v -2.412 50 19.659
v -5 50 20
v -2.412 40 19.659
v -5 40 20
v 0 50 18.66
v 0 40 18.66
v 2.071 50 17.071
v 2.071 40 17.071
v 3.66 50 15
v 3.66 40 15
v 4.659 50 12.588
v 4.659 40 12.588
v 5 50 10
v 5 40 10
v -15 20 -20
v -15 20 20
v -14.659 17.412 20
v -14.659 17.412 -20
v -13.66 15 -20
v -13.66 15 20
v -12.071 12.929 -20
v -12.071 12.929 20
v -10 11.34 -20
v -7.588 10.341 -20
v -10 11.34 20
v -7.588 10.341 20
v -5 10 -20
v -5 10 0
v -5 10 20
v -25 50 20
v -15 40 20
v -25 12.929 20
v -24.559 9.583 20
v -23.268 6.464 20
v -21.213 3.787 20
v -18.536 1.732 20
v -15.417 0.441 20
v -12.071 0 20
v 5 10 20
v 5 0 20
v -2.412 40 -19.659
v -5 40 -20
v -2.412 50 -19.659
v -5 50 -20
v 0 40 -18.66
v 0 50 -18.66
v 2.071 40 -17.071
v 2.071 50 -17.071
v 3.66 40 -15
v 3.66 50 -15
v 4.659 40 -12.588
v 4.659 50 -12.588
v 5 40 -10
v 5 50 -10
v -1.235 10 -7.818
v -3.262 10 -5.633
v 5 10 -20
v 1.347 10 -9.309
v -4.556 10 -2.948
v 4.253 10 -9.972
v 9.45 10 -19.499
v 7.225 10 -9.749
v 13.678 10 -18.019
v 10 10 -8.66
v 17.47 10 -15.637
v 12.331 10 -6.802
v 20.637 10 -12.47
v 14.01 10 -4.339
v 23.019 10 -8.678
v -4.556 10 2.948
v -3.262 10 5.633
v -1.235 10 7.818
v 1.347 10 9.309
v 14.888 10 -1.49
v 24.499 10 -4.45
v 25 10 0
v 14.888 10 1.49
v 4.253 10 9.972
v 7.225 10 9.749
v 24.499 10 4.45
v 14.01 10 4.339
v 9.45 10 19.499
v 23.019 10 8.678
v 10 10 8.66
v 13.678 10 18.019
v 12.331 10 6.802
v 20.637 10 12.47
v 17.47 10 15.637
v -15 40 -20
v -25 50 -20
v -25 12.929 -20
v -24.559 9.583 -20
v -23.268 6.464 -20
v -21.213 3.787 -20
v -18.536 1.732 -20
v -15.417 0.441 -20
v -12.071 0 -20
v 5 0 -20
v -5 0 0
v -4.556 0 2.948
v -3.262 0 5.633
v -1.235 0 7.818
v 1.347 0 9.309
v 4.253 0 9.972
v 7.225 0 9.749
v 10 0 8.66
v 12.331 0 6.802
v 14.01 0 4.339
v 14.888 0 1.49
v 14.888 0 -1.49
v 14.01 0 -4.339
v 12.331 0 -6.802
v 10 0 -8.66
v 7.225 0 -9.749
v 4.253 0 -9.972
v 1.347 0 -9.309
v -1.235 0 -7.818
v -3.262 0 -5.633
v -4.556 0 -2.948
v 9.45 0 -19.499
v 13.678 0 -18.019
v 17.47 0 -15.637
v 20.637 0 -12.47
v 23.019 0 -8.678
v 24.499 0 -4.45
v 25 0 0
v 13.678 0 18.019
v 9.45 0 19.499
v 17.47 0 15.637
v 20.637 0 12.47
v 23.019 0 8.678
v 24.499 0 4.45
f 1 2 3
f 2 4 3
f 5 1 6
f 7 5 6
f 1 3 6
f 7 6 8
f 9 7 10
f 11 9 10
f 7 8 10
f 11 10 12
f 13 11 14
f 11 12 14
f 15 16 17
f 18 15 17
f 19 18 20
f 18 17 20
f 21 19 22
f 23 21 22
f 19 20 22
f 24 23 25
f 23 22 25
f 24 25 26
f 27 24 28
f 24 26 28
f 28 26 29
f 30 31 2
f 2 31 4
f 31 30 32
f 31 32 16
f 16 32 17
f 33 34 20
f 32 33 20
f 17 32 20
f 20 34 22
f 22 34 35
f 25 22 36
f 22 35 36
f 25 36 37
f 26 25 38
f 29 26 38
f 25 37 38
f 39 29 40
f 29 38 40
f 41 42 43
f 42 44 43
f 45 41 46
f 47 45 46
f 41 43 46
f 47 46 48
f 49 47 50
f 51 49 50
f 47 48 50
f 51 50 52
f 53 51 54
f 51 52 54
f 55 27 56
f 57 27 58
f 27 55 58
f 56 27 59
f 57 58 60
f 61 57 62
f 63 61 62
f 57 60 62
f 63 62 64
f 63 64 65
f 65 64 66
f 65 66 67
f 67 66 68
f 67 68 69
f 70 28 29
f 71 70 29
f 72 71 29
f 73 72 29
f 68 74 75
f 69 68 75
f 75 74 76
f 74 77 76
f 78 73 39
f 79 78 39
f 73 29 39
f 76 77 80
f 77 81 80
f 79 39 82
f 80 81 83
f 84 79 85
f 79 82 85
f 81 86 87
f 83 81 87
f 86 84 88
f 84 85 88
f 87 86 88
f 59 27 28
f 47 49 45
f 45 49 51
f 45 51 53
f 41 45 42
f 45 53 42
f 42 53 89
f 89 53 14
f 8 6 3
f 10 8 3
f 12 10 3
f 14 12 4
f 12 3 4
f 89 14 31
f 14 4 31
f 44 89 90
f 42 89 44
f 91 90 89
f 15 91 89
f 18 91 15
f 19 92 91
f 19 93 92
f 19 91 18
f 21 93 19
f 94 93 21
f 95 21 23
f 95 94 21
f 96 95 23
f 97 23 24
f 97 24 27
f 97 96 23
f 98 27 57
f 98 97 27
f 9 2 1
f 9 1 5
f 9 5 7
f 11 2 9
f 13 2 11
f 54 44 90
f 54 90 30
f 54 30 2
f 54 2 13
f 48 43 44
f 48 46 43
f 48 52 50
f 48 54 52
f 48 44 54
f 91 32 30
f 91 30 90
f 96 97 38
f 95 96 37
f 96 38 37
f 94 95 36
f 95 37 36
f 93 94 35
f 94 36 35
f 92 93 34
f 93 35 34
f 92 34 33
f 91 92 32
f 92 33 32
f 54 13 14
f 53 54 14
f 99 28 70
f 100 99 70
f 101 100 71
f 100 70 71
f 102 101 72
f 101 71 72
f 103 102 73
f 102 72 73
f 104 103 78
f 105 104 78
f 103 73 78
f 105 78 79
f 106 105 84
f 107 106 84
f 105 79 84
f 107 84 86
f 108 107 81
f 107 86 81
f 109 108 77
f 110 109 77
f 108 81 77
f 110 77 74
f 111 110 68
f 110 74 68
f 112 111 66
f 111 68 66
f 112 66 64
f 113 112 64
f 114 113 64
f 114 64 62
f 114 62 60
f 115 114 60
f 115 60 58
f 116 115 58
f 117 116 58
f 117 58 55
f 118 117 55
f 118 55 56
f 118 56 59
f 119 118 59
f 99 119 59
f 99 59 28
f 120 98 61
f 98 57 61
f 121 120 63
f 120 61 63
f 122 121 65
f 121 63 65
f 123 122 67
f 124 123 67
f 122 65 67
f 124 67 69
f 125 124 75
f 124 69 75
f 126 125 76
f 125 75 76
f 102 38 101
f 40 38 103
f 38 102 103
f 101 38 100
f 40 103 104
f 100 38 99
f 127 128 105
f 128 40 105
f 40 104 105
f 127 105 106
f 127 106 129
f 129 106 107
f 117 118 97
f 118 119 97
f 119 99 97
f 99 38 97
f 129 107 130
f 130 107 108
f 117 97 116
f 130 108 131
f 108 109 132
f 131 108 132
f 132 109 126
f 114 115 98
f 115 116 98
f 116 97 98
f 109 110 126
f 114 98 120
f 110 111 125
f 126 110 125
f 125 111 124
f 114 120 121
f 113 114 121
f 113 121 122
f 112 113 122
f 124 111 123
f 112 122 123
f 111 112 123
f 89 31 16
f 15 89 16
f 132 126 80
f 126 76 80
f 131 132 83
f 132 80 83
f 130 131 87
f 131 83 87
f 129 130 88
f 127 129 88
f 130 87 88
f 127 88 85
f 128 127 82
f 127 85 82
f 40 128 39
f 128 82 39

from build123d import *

# Parameters (mm, degrees)
SKETCH_1_W          = 50
SKETCH_1_H          = 40
EXTRUDE_1_DEPTH     = 50
CUT_EXTRUDE_1_DEPTH = 69.738635424
FILLET_1_R          = 10
FILLET_2_R          = 20
SKETCH_4_R          = 10
CUT_EXTRUDE_2_DEPTH = 50


with BuildPart() as part:
    # 草圖1 → 填料-伸長1 (new body)
    with BuildSketch(Plane(origin=(0, 0, 0), x_dir=(1, 0, 0), z_dir=(0, 1, 0))):
        Rectangle(SKETCH_1_W, SKETCH_1_H)
    extrude(amount=EXTRUDE_1_DEPTH)

    # 草圖2 → 除料-伸長1 (cut, through all)
    with BuildSketch(Plane.XY.offset(20)):
        with BuildLine():
            Line((25, 50), (5, 50))
            Line((5, 50), (5, 40))
            Line((5, 40), (-15, 40))
            Line((-15, 40), (-15, 20))
            ThreePointArc((-15, 20), (-12.071067812, 12.928932188), (-5, 10))
            Line((-5, 10), (25, 10))
            Line((25, 10), (25, 50))
        make_face()
        with BuildLine():
            ThreePointArc((-12.071067812, 0), (-21.213203436, 3.786796564), (-25, 12.928932188))
            Line((-25, 12.928932188), (-25, 0))
            Line((-25, 0), (-12.071067812, 0))
        make_face()
    extrude(amount=-CUT_EXTRUDE_1_DEPTH, mode=Mode.SUBTRACT)

    # 圓角1
    fillet_1_edges = [part.edges().sort_by_distance(p)[0] for p in [
        (5, 45, -20),
        (5, 45, 20),
    ]]
    fillet(fillet_1_edges, radius=FILLET_1_R)

    # 圓角2
    fillet_2_edges = [part.edges().sort_by_distance(p)[0] for p in [
        (25, 5, -20),
        (25, 5, 20),
    ]]
    fillet(fillet_2_edges, radius=FILLET_2_R - 0.0001)  # a hair under: the kernel refuses the full size

    # 草圖4 → 除料-伸長2 (cut)
    with BuildSketch(Plane(origin=(0, 10, 0), x_dir=(1, 0, 0), z_dir=(0, 1, 0))):
        with Locations(Location((5, 0, 0), (0, 0, 180))):
            Circle(SKETCH_4_R)
    extrude(amount=-CUT_EXTRUDE_2_DEPTH, mode=Mode.SUBTRACT)


solid = part.part
